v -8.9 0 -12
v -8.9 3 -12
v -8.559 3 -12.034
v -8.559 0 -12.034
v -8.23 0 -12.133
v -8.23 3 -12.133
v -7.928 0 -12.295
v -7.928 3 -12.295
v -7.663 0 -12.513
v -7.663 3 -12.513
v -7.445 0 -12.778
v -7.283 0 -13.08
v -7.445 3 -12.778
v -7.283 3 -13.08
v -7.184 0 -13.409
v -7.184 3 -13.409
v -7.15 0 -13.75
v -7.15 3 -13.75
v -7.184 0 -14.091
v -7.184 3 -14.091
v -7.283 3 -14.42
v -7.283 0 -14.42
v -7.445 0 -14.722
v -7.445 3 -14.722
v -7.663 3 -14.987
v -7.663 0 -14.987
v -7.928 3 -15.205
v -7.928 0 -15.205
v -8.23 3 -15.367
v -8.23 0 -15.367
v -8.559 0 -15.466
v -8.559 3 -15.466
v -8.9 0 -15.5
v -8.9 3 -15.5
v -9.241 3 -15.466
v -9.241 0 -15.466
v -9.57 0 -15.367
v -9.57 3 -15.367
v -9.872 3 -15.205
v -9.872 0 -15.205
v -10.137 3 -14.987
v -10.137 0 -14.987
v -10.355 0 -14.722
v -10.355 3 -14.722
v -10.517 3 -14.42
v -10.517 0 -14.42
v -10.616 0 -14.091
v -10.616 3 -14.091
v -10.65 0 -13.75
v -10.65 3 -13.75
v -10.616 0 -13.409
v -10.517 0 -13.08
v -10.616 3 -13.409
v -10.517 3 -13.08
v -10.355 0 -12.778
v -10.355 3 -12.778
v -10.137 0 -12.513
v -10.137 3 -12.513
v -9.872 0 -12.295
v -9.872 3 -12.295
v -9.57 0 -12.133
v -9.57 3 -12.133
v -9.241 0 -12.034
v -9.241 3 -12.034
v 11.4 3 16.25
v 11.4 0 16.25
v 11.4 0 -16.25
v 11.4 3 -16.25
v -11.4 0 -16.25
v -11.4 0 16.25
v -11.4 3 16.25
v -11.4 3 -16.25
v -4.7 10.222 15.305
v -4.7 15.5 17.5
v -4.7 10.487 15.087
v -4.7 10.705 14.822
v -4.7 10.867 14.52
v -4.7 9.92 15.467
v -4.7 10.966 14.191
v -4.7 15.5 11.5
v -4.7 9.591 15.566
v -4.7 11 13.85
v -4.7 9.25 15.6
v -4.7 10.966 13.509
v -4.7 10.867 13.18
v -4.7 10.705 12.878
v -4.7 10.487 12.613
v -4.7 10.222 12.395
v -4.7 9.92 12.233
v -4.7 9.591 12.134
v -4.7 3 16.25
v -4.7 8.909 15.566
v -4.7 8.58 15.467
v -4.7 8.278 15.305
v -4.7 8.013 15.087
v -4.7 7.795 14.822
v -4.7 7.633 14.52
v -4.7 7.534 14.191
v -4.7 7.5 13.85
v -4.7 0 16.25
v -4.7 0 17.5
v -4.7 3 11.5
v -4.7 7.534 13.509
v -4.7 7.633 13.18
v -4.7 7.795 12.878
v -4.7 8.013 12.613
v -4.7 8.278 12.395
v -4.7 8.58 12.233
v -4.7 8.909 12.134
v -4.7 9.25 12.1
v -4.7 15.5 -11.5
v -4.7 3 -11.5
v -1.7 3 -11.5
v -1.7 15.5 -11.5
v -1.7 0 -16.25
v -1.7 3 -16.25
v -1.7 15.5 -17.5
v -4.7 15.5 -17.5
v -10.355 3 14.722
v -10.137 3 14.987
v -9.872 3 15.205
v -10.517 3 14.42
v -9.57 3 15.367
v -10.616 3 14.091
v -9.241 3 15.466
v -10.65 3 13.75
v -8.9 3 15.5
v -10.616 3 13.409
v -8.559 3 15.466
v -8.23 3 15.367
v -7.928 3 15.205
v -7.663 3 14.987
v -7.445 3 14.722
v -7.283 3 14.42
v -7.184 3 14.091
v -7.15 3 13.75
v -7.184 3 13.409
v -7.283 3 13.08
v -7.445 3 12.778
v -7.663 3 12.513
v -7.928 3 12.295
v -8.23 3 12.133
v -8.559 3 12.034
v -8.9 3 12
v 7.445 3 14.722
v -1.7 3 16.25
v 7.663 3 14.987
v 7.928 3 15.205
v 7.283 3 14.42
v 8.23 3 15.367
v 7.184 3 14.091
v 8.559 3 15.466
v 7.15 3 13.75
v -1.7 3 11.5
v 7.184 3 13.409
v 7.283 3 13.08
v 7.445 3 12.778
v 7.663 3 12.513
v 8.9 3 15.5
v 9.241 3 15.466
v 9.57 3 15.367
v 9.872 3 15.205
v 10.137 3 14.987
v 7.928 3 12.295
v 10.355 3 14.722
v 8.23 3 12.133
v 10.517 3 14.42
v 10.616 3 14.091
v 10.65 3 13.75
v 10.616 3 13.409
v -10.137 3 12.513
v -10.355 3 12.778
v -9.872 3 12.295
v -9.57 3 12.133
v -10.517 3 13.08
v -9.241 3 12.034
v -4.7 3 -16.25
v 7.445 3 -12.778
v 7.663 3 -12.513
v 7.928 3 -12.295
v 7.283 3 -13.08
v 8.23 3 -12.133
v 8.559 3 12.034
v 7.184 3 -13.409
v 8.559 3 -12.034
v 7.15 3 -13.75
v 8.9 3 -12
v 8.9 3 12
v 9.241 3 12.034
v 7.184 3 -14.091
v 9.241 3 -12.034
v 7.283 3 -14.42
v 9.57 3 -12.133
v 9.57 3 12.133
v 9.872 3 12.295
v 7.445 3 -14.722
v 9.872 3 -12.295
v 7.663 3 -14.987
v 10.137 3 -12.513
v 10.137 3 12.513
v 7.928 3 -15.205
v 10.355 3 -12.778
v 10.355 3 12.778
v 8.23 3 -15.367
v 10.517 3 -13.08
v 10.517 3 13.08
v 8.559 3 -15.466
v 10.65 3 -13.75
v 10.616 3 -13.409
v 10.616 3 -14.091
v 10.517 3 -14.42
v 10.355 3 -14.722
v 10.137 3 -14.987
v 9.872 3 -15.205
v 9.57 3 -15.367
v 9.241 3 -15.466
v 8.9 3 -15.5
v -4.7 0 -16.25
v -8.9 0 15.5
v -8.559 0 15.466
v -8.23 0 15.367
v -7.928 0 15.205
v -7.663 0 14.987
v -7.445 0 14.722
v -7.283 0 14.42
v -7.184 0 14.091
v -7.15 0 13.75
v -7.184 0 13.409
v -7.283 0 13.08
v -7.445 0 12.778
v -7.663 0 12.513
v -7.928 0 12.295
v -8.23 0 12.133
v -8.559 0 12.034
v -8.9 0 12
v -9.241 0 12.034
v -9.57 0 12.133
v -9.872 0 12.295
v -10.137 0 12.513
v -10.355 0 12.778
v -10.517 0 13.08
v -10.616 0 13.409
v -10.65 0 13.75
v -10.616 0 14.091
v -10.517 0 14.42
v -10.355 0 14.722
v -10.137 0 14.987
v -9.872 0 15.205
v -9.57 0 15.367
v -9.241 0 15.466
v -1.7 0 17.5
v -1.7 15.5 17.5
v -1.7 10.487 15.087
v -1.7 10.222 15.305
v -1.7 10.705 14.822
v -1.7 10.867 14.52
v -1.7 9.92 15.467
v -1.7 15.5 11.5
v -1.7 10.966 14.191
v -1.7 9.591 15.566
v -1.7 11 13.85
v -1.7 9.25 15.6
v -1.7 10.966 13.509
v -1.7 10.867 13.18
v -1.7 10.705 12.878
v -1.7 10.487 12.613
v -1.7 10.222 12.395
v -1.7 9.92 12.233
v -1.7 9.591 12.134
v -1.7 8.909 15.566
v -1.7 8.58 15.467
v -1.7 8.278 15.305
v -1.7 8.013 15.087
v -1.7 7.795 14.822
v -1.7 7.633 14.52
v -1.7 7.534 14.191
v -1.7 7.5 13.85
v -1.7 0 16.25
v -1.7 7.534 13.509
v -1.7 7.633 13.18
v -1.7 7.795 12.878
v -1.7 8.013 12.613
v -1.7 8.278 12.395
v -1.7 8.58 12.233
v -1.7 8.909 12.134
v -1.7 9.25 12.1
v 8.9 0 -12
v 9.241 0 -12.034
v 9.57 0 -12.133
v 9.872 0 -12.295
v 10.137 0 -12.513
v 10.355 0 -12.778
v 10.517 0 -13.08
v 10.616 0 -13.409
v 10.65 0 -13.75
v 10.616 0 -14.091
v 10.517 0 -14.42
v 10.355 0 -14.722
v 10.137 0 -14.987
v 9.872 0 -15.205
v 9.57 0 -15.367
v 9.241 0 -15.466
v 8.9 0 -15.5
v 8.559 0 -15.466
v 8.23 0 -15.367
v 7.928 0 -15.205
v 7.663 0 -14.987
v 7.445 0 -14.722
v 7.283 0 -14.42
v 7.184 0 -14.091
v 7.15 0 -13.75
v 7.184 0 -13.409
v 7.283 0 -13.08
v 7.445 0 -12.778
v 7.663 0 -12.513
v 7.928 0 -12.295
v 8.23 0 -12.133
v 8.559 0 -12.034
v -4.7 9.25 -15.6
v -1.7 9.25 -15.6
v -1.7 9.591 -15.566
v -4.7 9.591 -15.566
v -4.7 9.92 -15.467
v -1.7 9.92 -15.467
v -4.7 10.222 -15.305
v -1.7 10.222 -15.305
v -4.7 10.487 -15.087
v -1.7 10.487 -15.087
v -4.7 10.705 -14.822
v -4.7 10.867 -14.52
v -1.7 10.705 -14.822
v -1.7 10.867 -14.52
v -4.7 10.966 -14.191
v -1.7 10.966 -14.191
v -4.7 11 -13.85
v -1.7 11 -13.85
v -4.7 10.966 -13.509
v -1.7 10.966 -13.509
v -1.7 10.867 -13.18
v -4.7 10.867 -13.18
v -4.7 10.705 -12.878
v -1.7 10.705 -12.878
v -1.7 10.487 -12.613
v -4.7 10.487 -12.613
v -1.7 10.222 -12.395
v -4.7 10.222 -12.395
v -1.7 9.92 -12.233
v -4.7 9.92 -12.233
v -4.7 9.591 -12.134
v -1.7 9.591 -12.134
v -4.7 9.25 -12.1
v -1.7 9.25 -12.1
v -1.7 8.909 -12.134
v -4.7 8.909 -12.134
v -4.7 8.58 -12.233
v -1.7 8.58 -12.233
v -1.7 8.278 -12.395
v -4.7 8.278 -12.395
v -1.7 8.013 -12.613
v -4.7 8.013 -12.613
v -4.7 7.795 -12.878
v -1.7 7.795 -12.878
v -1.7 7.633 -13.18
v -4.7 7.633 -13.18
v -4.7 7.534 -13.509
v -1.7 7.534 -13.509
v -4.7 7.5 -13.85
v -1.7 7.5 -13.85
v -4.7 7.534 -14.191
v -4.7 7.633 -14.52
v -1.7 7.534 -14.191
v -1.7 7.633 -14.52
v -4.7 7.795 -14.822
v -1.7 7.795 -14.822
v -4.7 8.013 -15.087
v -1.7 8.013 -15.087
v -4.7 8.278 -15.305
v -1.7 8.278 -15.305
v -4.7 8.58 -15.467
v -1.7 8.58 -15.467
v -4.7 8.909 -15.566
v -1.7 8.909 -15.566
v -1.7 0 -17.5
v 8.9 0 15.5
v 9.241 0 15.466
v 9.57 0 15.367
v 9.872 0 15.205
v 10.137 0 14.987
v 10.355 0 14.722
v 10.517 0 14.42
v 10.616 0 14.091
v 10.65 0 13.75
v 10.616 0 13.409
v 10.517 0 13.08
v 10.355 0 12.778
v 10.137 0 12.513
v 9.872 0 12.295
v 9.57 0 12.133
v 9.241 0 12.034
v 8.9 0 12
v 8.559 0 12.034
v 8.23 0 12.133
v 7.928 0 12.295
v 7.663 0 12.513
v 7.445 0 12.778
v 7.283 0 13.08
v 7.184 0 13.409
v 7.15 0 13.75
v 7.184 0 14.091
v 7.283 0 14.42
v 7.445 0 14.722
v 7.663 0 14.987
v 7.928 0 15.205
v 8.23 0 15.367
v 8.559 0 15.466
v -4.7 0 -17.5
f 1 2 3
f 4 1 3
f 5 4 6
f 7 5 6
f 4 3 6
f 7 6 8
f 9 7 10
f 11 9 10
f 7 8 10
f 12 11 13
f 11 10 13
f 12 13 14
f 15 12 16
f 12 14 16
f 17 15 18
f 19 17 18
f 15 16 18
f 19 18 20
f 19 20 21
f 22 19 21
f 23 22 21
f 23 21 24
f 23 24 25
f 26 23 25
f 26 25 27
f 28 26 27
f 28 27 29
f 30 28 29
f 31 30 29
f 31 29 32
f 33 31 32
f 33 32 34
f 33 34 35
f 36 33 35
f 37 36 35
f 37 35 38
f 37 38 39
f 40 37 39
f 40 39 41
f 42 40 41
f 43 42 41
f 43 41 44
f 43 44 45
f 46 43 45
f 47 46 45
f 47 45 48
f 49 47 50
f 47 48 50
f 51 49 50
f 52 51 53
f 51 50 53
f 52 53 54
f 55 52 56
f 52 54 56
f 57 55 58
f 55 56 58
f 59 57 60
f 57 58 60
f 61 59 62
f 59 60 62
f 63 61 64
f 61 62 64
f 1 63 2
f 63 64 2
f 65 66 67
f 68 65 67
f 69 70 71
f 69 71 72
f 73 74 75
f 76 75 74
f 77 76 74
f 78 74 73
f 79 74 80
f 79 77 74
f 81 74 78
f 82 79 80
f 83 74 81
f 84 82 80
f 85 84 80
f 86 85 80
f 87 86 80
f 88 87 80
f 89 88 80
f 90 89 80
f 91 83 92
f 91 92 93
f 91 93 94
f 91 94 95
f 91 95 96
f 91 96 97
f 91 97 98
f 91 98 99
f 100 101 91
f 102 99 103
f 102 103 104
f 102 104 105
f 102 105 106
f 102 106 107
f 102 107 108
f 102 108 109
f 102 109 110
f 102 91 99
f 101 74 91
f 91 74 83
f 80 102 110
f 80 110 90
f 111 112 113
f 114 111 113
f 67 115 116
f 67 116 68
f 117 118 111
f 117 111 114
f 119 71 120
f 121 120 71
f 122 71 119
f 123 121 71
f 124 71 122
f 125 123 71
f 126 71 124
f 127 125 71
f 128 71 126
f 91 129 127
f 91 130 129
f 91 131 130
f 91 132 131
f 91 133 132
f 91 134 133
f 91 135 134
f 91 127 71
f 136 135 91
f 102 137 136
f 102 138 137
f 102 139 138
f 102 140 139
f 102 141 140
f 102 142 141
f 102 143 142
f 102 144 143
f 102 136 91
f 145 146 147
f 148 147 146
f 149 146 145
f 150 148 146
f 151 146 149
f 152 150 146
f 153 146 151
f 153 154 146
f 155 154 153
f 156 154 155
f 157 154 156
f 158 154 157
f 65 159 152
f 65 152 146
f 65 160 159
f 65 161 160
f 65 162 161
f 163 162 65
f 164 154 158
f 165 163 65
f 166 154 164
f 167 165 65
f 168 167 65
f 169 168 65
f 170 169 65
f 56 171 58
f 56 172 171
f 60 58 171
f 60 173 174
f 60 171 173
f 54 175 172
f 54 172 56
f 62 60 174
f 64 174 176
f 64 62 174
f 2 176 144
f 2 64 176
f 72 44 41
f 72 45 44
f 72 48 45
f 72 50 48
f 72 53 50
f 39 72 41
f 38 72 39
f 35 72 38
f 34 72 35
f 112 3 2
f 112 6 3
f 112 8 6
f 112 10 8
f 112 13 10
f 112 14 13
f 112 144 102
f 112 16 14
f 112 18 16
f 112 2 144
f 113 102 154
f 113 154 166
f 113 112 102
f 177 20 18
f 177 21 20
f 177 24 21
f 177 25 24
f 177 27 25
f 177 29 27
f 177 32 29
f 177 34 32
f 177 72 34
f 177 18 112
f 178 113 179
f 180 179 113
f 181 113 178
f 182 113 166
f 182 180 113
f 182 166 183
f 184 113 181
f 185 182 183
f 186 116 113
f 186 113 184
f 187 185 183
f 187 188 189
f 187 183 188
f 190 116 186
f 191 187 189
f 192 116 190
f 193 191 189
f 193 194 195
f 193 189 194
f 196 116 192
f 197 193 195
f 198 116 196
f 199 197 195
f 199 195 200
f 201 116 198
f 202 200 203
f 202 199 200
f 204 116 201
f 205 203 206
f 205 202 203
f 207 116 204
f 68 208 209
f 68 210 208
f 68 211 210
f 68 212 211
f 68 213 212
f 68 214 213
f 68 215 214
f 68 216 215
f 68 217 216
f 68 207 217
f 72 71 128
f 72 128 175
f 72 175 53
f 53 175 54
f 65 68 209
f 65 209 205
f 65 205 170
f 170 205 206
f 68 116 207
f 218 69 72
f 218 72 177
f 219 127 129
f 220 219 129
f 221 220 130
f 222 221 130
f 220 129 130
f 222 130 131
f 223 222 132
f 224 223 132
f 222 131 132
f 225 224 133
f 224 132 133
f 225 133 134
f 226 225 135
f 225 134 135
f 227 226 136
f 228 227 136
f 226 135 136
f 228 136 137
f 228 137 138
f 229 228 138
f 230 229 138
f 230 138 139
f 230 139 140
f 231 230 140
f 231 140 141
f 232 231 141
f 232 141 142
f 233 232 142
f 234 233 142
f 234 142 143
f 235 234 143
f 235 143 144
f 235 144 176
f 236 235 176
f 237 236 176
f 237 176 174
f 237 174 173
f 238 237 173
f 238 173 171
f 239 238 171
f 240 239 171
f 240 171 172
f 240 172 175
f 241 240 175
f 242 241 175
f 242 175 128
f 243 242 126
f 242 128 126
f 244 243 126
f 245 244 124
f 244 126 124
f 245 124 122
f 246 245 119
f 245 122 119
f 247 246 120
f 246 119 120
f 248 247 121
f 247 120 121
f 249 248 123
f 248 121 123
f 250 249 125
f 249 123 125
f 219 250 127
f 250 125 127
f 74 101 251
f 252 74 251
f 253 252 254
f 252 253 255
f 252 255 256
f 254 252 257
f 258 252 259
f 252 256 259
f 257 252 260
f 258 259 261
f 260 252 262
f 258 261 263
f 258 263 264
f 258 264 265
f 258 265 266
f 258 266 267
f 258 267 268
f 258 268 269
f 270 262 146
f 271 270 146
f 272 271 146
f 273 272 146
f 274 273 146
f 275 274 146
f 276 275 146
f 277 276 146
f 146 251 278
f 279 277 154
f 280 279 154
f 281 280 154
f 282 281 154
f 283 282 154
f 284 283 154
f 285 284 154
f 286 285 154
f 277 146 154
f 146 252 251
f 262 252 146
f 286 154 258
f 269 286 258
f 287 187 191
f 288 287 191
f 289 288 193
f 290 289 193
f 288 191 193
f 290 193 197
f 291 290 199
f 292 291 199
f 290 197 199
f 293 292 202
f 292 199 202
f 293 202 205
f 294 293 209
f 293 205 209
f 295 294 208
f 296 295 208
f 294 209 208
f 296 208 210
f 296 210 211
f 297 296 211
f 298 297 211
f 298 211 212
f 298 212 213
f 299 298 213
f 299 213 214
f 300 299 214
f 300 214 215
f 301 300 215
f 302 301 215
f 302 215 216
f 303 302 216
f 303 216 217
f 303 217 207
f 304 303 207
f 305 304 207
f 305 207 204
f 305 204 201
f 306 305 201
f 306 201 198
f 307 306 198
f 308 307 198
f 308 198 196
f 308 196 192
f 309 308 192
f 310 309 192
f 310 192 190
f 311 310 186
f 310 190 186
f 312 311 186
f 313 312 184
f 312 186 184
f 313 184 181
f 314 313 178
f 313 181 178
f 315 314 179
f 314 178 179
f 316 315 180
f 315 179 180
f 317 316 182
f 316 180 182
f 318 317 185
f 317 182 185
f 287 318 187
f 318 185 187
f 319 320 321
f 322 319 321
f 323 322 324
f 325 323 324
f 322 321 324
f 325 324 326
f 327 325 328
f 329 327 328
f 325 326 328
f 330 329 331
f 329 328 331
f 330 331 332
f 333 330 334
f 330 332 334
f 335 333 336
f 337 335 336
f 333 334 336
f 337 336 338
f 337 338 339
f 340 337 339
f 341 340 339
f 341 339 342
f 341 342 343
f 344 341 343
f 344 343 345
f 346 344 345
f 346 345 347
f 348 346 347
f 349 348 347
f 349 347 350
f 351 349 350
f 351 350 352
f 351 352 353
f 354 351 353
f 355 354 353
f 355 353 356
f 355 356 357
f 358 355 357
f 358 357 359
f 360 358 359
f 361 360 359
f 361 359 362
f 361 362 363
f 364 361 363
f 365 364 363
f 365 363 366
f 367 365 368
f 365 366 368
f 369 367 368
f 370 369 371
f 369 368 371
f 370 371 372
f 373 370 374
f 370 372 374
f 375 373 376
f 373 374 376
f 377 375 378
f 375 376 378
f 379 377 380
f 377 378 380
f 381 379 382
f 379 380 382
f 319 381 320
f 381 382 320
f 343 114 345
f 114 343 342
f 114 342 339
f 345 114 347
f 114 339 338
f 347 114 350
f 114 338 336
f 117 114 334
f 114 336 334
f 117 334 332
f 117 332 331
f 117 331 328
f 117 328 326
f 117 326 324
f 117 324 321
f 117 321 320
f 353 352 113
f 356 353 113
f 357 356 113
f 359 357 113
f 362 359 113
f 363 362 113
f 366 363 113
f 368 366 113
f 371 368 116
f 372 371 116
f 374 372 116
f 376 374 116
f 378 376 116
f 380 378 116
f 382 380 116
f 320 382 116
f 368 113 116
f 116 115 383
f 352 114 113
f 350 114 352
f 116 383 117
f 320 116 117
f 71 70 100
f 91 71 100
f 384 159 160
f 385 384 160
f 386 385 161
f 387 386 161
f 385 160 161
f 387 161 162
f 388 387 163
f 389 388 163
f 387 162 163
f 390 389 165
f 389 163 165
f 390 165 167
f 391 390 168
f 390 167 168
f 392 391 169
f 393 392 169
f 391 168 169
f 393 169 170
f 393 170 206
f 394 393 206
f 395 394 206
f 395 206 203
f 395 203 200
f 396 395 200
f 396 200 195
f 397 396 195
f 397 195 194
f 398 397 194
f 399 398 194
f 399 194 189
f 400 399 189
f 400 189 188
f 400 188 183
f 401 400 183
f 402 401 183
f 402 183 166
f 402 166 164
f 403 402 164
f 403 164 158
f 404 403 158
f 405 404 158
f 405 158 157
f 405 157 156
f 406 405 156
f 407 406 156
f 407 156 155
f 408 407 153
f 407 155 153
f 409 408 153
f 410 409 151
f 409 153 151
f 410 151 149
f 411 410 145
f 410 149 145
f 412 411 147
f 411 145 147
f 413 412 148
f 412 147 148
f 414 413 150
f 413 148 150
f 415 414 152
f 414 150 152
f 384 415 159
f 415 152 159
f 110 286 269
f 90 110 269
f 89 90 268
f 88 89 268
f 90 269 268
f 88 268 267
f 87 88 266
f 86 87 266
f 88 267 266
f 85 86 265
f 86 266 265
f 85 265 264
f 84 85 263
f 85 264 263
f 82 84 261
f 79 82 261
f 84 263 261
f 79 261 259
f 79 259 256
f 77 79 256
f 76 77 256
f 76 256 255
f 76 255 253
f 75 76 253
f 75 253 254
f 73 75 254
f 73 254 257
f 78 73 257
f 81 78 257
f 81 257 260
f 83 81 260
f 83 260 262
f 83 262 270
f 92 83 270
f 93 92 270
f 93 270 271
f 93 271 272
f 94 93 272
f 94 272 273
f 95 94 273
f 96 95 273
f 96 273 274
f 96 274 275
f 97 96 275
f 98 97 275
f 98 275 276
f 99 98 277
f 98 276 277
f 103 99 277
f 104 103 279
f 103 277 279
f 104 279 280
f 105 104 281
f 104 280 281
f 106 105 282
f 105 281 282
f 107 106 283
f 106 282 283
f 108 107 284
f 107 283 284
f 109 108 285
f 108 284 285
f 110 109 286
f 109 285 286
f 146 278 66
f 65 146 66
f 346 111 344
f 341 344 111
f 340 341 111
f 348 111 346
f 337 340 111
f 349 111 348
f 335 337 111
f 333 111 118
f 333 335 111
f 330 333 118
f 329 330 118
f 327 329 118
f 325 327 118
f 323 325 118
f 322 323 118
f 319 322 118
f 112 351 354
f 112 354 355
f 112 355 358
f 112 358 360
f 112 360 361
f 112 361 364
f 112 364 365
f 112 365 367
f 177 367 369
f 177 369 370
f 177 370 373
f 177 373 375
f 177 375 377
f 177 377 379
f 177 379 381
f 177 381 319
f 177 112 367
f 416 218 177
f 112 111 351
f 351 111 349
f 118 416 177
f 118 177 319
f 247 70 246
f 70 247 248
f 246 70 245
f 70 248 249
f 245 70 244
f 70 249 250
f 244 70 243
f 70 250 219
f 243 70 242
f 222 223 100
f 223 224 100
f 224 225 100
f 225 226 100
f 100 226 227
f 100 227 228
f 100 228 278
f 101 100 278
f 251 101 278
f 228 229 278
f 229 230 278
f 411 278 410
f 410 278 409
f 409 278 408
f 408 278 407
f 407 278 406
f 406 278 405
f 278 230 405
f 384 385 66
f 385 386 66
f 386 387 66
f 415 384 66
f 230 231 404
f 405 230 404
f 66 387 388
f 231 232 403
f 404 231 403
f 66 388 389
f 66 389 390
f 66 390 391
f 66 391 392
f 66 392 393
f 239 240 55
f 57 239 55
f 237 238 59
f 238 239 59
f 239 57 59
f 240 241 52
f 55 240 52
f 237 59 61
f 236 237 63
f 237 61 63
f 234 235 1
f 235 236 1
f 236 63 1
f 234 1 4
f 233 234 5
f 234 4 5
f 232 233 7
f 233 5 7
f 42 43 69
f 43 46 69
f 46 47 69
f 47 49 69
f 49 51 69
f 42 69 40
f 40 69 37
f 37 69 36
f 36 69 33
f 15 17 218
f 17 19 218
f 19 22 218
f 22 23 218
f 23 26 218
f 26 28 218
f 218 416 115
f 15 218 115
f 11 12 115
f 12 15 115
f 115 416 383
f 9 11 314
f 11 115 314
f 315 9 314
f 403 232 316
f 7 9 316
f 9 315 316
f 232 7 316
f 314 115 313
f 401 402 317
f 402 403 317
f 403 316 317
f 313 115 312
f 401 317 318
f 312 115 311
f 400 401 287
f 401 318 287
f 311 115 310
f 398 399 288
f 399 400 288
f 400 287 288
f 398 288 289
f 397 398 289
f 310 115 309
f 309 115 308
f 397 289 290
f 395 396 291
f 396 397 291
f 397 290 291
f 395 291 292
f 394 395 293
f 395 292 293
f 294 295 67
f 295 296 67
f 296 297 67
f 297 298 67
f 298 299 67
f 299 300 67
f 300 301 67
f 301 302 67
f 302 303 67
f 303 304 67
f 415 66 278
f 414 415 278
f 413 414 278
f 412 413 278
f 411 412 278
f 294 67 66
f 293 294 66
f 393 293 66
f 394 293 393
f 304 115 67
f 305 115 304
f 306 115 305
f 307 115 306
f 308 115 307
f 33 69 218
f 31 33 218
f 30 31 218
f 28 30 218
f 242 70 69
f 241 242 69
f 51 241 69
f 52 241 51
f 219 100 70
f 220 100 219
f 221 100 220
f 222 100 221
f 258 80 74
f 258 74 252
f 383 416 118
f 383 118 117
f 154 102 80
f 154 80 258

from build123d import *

# Parameters (mm, degrees)
SKETCH_1_W          = 22.8
SKETCH_1_H          = 32.5
EXTRUDE_1_DEPTH     = 3
SKETCH_4_R          = 1.75
CUT_EXTRUDE_2_DEPTH = 10
EXTRUDE_START       = -3
SKETCH_2_W          = 3
SKETCH_2_H          = 6
EXTRUDE_2_DEPTH     = 15.5
SKETCH_3_R          = 1.75
CUT_EXTRUDE_1_DEPTH = 27.797574517


with BuildPart() as part:
    # 草图1 → 凸台-拉伸1 (new body)
    with BuildSketch(Plane(origin=(0, 0, 0), x_dir=(1, 0, 0), z_dir=(0, 1, 0))):
        Rectangle(SKETCH_1_W, SKETCH_1_H)
    extrude(amount=EXTRUDE_1_DEPTH)

    # 草图4 → 切除-拉伸2 (cut)
    with BuildSketch(Plane(origin=(0, 3, 0), x_dir=(1, 0, 0), z_dir=(0, 1, 0))):
        with Locations(Location((-8.9, 13.75, 0), (0, 0, 270))):
            Circle(SKETCH_4_R)
        with Locations(Location((8.9, 13.75, 0), (0, 0, 270))):
            Circle(SKETCH_4_R)
        with Locations(Location((-8.9, -13.75, 0), (0, 0, 270))):
            Circle(SKETCH_4_R)
        with Locations(Location((8.9, -13.75, 0), (0, 0, 270))):
            Circle(SKETCH_4_R)
    extrude(amount=-CUT_EXTRUDE_2_DEPTH, mode=Mode.SUBTRACT)

    # 草图2 → 凸台-拉伸2 (add)
    with BuildSketch(Plane(origin=(0, 3, 0), x_dir=(1, 0, 0), z_dir=(0, 1, 0)).offset(EXTRUDE_START)):
        with Locations((-3.2, -14.5)):
            Rectangle(SKETCH_2_W, SKETCH_2_H)
        with Locations((-3.2, 14.5)):
            Rectangle(SKETCH_2_W, SKETCH_2_H)
    extrude(amount=EXTRUDE_2_DEPTH)

    # 草图3 → 切除-拉伸1 (cut, through all)
    with BuildSketch(Plane(origin=(-1.7, 0, 0), x_dir=(0, 0, -1), z_dir=(1, 0, 0))):
        with Locations((-13.85, 9.25)):
            Circle(SKETCH_3_R)
        with Locations((13.85, 9.25)):
            Circle(SKETCH_3_R)
    extrude(amount=-CUT_EXTRUDE_1_DEPTH, mode=Mode.SUBTRACT)


solid = part.part
